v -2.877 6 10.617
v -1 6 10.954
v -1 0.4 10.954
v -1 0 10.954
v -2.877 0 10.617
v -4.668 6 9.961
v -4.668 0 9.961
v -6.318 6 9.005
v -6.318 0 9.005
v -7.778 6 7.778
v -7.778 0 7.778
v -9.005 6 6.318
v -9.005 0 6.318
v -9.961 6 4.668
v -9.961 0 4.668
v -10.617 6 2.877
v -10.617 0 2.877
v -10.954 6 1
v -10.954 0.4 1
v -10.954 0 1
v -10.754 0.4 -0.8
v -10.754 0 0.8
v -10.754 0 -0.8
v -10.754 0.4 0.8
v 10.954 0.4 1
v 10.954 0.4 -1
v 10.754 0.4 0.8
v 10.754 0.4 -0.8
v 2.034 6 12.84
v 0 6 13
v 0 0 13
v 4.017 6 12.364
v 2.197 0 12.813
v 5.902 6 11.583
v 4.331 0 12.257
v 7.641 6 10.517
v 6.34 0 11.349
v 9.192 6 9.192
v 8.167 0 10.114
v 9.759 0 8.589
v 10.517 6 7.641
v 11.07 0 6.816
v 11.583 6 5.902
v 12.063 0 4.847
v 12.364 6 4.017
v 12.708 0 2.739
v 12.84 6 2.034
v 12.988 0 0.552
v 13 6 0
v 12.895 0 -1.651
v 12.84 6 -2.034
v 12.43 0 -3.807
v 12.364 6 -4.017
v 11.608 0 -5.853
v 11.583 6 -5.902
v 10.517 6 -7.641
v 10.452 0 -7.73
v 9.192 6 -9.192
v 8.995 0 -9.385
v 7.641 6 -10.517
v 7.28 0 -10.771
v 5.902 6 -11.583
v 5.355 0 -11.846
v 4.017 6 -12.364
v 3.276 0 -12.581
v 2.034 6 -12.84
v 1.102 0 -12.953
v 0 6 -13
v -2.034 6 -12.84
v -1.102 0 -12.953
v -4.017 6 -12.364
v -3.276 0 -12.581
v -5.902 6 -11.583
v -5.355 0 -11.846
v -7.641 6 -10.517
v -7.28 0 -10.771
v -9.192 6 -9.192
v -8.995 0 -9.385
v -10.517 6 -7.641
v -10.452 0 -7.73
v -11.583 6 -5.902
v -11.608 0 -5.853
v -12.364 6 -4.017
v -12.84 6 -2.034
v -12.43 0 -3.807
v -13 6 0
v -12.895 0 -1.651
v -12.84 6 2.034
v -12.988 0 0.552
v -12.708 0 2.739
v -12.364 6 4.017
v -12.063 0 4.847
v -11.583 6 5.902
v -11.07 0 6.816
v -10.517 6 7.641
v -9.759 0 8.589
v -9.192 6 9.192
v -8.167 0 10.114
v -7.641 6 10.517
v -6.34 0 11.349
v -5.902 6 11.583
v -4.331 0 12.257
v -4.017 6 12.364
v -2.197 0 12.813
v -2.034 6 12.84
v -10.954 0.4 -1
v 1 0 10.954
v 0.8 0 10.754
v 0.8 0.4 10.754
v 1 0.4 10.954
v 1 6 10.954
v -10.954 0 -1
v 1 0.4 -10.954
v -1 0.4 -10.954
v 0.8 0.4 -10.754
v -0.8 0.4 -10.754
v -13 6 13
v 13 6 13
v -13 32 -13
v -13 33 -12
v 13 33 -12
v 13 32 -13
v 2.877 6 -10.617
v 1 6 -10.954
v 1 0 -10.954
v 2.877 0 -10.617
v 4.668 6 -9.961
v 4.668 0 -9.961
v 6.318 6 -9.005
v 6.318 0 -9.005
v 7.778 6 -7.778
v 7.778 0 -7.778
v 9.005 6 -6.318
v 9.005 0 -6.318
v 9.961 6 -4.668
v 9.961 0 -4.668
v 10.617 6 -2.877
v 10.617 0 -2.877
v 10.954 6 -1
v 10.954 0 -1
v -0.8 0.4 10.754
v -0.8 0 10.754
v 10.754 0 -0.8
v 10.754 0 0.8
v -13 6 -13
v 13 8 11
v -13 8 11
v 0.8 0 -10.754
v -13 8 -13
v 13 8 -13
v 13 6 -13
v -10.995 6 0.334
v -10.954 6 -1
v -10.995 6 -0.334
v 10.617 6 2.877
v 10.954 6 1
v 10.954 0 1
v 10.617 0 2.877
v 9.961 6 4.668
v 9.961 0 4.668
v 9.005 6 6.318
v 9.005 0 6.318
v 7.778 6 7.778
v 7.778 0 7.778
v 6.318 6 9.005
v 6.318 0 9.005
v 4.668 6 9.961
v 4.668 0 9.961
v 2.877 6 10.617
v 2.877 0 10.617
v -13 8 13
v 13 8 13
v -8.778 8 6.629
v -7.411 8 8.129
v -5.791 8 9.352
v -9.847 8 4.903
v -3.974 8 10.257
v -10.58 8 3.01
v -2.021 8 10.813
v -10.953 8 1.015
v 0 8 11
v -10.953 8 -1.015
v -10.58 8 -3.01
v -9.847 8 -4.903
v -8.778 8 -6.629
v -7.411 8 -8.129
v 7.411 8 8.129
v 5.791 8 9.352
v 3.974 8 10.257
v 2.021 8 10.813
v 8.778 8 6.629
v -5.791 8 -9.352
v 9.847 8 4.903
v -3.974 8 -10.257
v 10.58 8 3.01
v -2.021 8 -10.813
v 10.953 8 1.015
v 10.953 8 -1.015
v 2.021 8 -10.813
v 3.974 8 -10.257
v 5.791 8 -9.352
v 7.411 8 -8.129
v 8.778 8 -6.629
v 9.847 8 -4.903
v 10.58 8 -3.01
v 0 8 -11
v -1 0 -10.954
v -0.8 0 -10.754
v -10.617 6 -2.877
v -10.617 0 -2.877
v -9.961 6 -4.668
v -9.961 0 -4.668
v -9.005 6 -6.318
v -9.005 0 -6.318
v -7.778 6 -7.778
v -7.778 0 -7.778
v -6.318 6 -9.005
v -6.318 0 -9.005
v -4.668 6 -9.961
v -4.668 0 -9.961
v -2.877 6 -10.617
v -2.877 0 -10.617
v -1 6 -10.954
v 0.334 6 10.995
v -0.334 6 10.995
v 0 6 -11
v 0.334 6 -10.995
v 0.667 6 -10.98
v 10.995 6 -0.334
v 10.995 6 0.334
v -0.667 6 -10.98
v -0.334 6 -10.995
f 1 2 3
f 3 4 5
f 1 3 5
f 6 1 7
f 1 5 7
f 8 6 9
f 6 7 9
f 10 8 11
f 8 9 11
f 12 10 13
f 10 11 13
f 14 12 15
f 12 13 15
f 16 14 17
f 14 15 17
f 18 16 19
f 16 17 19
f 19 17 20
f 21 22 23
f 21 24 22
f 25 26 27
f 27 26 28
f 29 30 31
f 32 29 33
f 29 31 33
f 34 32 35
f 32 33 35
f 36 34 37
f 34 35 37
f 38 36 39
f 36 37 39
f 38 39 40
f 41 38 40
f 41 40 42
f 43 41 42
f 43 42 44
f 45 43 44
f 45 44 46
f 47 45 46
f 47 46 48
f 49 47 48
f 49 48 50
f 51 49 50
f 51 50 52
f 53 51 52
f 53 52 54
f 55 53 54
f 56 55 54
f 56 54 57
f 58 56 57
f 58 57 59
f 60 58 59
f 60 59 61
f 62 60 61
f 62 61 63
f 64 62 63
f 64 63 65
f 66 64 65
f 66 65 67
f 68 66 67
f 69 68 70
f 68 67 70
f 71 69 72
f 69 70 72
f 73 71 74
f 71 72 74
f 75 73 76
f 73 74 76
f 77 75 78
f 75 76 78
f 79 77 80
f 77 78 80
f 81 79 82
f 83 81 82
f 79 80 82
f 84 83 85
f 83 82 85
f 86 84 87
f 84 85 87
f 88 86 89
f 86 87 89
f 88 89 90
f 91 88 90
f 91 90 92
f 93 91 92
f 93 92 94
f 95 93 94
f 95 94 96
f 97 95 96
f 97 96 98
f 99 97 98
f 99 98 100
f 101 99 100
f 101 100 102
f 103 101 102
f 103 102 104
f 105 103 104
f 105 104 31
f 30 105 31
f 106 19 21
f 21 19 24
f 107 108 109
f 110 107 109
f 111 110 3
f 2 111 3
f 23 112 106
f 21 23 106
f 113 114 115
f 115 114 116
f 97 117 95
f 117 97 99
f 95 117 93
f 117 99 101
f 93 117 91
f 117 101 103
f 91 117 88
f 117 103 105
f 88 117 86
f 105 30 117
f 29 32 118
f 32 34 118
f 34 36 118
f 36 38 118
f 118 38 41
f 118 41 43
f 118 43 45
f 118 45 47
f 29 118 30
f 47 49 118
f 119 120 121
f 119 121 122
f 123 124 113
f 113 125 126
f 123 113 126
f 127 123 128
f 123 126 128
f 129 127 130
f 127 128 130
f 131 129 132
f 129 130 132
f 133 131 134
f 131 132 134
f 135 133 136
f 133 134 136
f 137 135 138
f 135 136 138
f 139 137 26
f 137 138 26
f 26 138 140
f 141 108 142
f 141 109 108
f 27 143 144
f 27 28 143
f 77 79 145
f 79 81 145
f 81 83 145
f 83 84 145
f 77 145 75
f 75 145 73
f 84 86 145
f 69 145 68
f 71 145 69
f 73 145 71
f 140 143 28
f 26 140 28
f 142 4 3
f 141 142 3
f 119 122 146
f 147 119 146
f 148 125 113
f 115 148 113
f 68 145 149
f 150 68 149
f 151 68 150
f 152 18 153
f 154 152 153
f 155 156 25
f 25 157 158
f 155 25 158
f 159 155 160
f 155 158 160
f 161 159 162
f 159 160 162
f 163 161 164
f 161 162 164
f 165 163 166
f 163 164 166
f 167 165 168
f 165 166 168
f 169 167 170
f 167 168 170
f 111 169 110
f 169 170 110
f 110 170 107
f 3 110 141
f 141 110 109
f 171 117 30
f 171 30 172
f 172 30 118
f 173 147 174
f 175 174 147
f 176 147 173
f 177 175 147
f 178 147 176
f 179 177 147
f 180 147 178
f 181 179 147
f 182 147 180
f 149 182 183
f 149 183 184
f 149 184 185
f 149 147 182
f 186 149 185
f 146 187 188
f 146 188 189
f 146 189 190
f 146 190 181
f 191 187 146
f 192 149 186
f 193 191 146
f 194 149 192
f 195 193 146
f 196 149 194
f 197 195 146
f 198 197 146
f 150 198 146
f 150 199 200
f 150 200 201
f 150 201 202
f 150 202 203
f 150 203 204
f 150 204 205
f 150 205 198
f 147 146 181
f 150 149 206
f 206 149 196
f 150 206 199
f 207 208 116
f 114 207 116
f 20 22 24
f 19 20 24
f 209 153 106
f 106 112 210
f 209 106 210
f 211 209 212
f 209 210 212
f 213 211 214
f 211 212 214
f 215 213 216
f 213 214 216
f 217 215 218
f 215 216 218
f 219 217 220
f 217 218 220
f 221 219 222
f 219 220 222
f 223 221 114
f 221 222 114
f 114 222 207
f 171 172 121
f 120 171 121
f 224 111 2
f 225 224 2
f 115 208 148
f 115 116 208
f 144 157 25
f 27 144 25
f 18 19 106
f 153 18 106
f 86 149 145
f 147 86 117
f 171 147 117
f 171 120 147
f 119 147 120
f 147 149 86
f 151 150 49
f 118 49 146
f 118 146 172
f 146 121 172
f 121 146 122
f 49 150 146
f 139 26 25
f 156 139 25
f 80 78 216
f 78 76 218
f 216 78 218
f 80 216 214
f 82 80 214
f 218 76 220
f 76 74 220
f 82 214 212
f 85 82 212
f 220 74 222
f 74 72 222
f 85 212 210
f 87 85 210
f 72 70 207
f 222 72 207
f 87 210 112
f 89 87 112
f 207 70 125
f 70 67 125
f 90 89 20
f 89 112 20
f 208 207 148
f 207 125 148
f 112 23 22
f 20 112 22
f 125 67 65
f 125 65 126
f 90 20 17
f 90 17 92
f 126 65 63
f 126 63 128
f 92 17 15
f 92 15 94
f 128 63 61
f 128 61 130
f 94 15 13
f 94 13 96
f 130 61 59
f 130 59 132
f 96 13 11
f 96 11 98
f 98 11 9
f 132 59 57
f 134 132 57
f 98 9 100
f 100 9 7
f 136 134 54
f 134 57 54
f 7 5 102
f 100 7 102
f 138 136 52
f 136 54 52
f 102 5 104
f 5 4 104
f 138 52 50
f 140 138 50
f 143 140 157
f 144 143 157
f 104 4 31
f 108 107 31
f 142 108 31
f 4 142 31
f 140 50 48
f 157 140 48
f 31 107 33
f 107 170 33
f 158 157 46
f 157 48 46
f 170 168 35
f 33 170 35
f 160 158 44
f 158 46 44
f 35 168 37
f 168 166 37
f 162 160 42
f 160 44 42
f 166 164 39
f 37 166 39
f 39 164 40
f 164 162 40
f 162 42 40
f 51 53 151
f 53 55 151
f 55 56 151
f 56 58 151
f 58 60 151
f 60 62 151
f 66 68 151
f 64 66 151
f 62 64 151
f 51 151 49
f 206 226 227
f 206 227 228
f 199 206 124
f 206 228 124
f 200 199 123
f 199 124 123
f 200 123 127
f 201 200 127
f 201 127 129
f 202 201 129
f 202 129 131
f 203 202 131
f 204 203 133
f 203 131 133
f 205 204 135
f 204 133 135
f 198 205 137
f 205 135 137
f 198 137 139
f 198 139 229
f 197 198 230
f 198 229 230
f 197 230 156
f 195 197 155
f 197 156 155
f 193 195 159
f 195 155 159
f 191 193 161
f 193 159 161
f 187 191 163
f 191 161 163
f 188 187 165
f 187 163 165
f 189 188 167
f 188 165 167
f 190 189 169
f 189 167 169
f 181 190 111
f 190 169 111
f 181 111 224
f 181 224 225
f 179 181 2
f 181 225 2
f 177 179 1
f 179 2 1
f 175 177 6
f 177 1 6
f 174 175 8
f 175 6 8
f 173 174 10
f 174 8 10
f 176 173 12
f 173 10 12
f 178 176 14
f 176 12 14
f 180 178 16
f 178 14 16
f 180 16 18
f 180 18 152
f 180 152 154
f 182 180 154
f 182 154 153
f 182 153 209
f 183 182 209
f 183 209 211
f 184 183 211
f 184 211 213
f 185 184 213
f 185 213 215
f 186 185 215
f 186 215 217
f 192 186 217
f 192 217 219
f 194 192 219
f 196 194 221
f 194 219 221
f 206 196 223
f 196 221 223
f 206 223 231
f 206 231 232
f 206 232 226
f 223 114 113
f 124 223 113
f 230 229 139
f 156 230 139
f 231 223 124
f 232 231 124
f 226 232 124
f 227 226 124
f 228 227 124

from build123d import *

# Parameters (mm, degrees)
SKETCH1_R           = 13
BOSS_EXTRUDE1_DEPTH = 6
SKETCH2_W           = 2
SKETCH2_H           = 0.4
BOSS_EXTRUDE2_DEPTH = 0.2
SKETCH3_W           = 2
SKETCH3_H           = 0.4
BOSS_EXTRUDE3_DEPTH = 0.2
SKETCH4_W           = 2
SKETCH4_H           = 0.4
BOSS_EXTRUDE4_DEPTH = 0.2
CHAMFER1_SIZE       = 0.2
SKETCH5_W           = 2
SKETCH5_H           = 0.4
BOSS_EXTRUDE5_DEPTH = 0.2
CHAMFER2_SIZE       = 0.2
SKETCH6_W           = 26
SKETCH6_H           = 26
BOSS_EXTRUDE6_DEPTH = 2
SKETCH7_R           = 11
CUT_EXTRUDE1_DEPTH  = 2
BOSS_EXTRUDE7_DEPTH = 26


with BuildPart() as part:
    # Sketch1 → Boss-Extrude1 (new body)
    with BuildSketch(Plane(origin=(0, 0, 0), x_dir=(1, 0, 0), z_dir=(0, 1, 0))):
        with Locations(Location((0, 0, 0), (0, 0, 270))):
            Circle(SKETCH1_R)
        with BuildLine():
            Line((-1, 10.95445115), (1, 10.95445115))
            ThreePointArc((1, 10.95445115), (7.778174593, 7.778174593), (10.95445115, 1))
            Line((10.95445115, 1), (10.95445115, -1))
            ThreePointArc((10.95445115, -1), (7.778174593, -7.778174593), (1, -10.95445115))
            Line((1, -10.95445115), (-1, -10.95445115))
            ThreePointArc((-1, -10.95445115), (-7.778174593, -7.778174593), (-10.95445115, -1))
            Line((-10.95445115, -1), (-10.95445115, 1))
            ThreePointArc((-10.95445115, 1), (-7.778174593, 7.778174593), (-1, 10.95445115))
        make_face(mode=Mode.SUBTRACT)
    extrude(amount=BOSS_EXTRUDE1_DEPTH)

    # Sketch2 → Boss-Extrude2 (add)
    with BuildSketch(Plane.XY.offset(-10.95445115)):
        with Locations((0, 0.2)):
            Rectangle(SKETCH2_W, SKETCH2_H)
    extrude(amount=BOSS_EXTRUDE2_DEPTH)

    # Sketch3 → Boss-Extrude3 (add)
    with BuildSketch(Plane(origin=(-10.95445115, 0, 0), x_dir=(0, 0, -1), z_dir=(1, 0, 0))):
        with Locations((0, 0.2)):
            Rectangle(SKETCH3_W, SKETCH3_H)
    extrude(amount=BOSS_EXTRUDE3_DEPTH)

    # Sketch4 → Boss-Extrude4 (add)
    with BuildSketch(Plane(origin=(0, 0, 10.95445115), x_dir=(-1, 0, 0), z_dir=(0, 0, -1))):
        with Locations((0, 0.2)):
            Rectangle(SKETCH4_W, SKETCH4_H)
    extrude(amount=BOSS_EXTRUDE4_DEPTH)

    # Chamfer1
    chamfer1_edges = [part.edges().sort_by_distance(p)[0] for p in [
        (1, 0.2, -10.75445115),
        (-1, 0.2, -10.75445115),
        (-10.75445115, 0.2, 1),
        (-10.75445115, 0.2, -1),
        (-1, 0.2, 10.75445115),
        (1, 0.2, 10.75445115),
    ]]
    chamfer(chamfer1_edges, length=CHAMFER1_SIZE - 0.0001)  # a hair under: the kernel refuses the full size

    # Sketch5 → Boss-Extrude5 (add)
    with BuildSketch(Plane.ZY.offset(-10.95445115)):
        with Locations((0, 0.2)):
            Rectangle(SKETCH5_W, SKETCH5_H)
    extrude(amount=BOSS_EXTRUDE5_DEPTH)

    # Chamfer2
    chamfer2_edges = [part.edges().sort_by_distance(p)[0] for p in [
        (10.75445115, 0.2, 1),
        (10.75445115, 0.2, -1),
    ]]
    chamfer(chamfer2_edges, length=CHAMFER2_SIZE - 0.0001)  # a hair under: the kernel refuses the full size

    # Sketch6 → Boss-Extrude6 (add)
    with BuildSketch(Plane(origin=(0, 6, 0), x_dir=(1, 0, 0), z_dir=(0, 1, 0))):
        Rectangle(SKETCH6_W, SKETCH6_H)
    extrude(amount=BOSS_EXTRUDE6_DEPTH)

    # Sketch7 → Cut-Extrude1 (cut)
    with BuildSketch(Plane.XZ.offset(-6)):
        with Locations(Location((0, 0, 0), (0, 0, 270))):
            Circle(SKETCH7_R)
    extrude(amount=-CUT_EXTRUDE1_DEPTH, mode=Mode.SUBTRACT)

    # Sketch8 → Boss-Extrude7 (add)
    with BuildSketch(Plane(origin=(13, 0, 0), x_dir=(0, 0, -1), z_dir=(1, 0, 0))):
        Polygon((-13, 8), (12.000151011, 33.000151011), (13, 32.000302023), (-11.000302023, 8), align=None)
    extrude(amount=-BOSS_EXTRUDE7_DEPTH)


solid = part.part
